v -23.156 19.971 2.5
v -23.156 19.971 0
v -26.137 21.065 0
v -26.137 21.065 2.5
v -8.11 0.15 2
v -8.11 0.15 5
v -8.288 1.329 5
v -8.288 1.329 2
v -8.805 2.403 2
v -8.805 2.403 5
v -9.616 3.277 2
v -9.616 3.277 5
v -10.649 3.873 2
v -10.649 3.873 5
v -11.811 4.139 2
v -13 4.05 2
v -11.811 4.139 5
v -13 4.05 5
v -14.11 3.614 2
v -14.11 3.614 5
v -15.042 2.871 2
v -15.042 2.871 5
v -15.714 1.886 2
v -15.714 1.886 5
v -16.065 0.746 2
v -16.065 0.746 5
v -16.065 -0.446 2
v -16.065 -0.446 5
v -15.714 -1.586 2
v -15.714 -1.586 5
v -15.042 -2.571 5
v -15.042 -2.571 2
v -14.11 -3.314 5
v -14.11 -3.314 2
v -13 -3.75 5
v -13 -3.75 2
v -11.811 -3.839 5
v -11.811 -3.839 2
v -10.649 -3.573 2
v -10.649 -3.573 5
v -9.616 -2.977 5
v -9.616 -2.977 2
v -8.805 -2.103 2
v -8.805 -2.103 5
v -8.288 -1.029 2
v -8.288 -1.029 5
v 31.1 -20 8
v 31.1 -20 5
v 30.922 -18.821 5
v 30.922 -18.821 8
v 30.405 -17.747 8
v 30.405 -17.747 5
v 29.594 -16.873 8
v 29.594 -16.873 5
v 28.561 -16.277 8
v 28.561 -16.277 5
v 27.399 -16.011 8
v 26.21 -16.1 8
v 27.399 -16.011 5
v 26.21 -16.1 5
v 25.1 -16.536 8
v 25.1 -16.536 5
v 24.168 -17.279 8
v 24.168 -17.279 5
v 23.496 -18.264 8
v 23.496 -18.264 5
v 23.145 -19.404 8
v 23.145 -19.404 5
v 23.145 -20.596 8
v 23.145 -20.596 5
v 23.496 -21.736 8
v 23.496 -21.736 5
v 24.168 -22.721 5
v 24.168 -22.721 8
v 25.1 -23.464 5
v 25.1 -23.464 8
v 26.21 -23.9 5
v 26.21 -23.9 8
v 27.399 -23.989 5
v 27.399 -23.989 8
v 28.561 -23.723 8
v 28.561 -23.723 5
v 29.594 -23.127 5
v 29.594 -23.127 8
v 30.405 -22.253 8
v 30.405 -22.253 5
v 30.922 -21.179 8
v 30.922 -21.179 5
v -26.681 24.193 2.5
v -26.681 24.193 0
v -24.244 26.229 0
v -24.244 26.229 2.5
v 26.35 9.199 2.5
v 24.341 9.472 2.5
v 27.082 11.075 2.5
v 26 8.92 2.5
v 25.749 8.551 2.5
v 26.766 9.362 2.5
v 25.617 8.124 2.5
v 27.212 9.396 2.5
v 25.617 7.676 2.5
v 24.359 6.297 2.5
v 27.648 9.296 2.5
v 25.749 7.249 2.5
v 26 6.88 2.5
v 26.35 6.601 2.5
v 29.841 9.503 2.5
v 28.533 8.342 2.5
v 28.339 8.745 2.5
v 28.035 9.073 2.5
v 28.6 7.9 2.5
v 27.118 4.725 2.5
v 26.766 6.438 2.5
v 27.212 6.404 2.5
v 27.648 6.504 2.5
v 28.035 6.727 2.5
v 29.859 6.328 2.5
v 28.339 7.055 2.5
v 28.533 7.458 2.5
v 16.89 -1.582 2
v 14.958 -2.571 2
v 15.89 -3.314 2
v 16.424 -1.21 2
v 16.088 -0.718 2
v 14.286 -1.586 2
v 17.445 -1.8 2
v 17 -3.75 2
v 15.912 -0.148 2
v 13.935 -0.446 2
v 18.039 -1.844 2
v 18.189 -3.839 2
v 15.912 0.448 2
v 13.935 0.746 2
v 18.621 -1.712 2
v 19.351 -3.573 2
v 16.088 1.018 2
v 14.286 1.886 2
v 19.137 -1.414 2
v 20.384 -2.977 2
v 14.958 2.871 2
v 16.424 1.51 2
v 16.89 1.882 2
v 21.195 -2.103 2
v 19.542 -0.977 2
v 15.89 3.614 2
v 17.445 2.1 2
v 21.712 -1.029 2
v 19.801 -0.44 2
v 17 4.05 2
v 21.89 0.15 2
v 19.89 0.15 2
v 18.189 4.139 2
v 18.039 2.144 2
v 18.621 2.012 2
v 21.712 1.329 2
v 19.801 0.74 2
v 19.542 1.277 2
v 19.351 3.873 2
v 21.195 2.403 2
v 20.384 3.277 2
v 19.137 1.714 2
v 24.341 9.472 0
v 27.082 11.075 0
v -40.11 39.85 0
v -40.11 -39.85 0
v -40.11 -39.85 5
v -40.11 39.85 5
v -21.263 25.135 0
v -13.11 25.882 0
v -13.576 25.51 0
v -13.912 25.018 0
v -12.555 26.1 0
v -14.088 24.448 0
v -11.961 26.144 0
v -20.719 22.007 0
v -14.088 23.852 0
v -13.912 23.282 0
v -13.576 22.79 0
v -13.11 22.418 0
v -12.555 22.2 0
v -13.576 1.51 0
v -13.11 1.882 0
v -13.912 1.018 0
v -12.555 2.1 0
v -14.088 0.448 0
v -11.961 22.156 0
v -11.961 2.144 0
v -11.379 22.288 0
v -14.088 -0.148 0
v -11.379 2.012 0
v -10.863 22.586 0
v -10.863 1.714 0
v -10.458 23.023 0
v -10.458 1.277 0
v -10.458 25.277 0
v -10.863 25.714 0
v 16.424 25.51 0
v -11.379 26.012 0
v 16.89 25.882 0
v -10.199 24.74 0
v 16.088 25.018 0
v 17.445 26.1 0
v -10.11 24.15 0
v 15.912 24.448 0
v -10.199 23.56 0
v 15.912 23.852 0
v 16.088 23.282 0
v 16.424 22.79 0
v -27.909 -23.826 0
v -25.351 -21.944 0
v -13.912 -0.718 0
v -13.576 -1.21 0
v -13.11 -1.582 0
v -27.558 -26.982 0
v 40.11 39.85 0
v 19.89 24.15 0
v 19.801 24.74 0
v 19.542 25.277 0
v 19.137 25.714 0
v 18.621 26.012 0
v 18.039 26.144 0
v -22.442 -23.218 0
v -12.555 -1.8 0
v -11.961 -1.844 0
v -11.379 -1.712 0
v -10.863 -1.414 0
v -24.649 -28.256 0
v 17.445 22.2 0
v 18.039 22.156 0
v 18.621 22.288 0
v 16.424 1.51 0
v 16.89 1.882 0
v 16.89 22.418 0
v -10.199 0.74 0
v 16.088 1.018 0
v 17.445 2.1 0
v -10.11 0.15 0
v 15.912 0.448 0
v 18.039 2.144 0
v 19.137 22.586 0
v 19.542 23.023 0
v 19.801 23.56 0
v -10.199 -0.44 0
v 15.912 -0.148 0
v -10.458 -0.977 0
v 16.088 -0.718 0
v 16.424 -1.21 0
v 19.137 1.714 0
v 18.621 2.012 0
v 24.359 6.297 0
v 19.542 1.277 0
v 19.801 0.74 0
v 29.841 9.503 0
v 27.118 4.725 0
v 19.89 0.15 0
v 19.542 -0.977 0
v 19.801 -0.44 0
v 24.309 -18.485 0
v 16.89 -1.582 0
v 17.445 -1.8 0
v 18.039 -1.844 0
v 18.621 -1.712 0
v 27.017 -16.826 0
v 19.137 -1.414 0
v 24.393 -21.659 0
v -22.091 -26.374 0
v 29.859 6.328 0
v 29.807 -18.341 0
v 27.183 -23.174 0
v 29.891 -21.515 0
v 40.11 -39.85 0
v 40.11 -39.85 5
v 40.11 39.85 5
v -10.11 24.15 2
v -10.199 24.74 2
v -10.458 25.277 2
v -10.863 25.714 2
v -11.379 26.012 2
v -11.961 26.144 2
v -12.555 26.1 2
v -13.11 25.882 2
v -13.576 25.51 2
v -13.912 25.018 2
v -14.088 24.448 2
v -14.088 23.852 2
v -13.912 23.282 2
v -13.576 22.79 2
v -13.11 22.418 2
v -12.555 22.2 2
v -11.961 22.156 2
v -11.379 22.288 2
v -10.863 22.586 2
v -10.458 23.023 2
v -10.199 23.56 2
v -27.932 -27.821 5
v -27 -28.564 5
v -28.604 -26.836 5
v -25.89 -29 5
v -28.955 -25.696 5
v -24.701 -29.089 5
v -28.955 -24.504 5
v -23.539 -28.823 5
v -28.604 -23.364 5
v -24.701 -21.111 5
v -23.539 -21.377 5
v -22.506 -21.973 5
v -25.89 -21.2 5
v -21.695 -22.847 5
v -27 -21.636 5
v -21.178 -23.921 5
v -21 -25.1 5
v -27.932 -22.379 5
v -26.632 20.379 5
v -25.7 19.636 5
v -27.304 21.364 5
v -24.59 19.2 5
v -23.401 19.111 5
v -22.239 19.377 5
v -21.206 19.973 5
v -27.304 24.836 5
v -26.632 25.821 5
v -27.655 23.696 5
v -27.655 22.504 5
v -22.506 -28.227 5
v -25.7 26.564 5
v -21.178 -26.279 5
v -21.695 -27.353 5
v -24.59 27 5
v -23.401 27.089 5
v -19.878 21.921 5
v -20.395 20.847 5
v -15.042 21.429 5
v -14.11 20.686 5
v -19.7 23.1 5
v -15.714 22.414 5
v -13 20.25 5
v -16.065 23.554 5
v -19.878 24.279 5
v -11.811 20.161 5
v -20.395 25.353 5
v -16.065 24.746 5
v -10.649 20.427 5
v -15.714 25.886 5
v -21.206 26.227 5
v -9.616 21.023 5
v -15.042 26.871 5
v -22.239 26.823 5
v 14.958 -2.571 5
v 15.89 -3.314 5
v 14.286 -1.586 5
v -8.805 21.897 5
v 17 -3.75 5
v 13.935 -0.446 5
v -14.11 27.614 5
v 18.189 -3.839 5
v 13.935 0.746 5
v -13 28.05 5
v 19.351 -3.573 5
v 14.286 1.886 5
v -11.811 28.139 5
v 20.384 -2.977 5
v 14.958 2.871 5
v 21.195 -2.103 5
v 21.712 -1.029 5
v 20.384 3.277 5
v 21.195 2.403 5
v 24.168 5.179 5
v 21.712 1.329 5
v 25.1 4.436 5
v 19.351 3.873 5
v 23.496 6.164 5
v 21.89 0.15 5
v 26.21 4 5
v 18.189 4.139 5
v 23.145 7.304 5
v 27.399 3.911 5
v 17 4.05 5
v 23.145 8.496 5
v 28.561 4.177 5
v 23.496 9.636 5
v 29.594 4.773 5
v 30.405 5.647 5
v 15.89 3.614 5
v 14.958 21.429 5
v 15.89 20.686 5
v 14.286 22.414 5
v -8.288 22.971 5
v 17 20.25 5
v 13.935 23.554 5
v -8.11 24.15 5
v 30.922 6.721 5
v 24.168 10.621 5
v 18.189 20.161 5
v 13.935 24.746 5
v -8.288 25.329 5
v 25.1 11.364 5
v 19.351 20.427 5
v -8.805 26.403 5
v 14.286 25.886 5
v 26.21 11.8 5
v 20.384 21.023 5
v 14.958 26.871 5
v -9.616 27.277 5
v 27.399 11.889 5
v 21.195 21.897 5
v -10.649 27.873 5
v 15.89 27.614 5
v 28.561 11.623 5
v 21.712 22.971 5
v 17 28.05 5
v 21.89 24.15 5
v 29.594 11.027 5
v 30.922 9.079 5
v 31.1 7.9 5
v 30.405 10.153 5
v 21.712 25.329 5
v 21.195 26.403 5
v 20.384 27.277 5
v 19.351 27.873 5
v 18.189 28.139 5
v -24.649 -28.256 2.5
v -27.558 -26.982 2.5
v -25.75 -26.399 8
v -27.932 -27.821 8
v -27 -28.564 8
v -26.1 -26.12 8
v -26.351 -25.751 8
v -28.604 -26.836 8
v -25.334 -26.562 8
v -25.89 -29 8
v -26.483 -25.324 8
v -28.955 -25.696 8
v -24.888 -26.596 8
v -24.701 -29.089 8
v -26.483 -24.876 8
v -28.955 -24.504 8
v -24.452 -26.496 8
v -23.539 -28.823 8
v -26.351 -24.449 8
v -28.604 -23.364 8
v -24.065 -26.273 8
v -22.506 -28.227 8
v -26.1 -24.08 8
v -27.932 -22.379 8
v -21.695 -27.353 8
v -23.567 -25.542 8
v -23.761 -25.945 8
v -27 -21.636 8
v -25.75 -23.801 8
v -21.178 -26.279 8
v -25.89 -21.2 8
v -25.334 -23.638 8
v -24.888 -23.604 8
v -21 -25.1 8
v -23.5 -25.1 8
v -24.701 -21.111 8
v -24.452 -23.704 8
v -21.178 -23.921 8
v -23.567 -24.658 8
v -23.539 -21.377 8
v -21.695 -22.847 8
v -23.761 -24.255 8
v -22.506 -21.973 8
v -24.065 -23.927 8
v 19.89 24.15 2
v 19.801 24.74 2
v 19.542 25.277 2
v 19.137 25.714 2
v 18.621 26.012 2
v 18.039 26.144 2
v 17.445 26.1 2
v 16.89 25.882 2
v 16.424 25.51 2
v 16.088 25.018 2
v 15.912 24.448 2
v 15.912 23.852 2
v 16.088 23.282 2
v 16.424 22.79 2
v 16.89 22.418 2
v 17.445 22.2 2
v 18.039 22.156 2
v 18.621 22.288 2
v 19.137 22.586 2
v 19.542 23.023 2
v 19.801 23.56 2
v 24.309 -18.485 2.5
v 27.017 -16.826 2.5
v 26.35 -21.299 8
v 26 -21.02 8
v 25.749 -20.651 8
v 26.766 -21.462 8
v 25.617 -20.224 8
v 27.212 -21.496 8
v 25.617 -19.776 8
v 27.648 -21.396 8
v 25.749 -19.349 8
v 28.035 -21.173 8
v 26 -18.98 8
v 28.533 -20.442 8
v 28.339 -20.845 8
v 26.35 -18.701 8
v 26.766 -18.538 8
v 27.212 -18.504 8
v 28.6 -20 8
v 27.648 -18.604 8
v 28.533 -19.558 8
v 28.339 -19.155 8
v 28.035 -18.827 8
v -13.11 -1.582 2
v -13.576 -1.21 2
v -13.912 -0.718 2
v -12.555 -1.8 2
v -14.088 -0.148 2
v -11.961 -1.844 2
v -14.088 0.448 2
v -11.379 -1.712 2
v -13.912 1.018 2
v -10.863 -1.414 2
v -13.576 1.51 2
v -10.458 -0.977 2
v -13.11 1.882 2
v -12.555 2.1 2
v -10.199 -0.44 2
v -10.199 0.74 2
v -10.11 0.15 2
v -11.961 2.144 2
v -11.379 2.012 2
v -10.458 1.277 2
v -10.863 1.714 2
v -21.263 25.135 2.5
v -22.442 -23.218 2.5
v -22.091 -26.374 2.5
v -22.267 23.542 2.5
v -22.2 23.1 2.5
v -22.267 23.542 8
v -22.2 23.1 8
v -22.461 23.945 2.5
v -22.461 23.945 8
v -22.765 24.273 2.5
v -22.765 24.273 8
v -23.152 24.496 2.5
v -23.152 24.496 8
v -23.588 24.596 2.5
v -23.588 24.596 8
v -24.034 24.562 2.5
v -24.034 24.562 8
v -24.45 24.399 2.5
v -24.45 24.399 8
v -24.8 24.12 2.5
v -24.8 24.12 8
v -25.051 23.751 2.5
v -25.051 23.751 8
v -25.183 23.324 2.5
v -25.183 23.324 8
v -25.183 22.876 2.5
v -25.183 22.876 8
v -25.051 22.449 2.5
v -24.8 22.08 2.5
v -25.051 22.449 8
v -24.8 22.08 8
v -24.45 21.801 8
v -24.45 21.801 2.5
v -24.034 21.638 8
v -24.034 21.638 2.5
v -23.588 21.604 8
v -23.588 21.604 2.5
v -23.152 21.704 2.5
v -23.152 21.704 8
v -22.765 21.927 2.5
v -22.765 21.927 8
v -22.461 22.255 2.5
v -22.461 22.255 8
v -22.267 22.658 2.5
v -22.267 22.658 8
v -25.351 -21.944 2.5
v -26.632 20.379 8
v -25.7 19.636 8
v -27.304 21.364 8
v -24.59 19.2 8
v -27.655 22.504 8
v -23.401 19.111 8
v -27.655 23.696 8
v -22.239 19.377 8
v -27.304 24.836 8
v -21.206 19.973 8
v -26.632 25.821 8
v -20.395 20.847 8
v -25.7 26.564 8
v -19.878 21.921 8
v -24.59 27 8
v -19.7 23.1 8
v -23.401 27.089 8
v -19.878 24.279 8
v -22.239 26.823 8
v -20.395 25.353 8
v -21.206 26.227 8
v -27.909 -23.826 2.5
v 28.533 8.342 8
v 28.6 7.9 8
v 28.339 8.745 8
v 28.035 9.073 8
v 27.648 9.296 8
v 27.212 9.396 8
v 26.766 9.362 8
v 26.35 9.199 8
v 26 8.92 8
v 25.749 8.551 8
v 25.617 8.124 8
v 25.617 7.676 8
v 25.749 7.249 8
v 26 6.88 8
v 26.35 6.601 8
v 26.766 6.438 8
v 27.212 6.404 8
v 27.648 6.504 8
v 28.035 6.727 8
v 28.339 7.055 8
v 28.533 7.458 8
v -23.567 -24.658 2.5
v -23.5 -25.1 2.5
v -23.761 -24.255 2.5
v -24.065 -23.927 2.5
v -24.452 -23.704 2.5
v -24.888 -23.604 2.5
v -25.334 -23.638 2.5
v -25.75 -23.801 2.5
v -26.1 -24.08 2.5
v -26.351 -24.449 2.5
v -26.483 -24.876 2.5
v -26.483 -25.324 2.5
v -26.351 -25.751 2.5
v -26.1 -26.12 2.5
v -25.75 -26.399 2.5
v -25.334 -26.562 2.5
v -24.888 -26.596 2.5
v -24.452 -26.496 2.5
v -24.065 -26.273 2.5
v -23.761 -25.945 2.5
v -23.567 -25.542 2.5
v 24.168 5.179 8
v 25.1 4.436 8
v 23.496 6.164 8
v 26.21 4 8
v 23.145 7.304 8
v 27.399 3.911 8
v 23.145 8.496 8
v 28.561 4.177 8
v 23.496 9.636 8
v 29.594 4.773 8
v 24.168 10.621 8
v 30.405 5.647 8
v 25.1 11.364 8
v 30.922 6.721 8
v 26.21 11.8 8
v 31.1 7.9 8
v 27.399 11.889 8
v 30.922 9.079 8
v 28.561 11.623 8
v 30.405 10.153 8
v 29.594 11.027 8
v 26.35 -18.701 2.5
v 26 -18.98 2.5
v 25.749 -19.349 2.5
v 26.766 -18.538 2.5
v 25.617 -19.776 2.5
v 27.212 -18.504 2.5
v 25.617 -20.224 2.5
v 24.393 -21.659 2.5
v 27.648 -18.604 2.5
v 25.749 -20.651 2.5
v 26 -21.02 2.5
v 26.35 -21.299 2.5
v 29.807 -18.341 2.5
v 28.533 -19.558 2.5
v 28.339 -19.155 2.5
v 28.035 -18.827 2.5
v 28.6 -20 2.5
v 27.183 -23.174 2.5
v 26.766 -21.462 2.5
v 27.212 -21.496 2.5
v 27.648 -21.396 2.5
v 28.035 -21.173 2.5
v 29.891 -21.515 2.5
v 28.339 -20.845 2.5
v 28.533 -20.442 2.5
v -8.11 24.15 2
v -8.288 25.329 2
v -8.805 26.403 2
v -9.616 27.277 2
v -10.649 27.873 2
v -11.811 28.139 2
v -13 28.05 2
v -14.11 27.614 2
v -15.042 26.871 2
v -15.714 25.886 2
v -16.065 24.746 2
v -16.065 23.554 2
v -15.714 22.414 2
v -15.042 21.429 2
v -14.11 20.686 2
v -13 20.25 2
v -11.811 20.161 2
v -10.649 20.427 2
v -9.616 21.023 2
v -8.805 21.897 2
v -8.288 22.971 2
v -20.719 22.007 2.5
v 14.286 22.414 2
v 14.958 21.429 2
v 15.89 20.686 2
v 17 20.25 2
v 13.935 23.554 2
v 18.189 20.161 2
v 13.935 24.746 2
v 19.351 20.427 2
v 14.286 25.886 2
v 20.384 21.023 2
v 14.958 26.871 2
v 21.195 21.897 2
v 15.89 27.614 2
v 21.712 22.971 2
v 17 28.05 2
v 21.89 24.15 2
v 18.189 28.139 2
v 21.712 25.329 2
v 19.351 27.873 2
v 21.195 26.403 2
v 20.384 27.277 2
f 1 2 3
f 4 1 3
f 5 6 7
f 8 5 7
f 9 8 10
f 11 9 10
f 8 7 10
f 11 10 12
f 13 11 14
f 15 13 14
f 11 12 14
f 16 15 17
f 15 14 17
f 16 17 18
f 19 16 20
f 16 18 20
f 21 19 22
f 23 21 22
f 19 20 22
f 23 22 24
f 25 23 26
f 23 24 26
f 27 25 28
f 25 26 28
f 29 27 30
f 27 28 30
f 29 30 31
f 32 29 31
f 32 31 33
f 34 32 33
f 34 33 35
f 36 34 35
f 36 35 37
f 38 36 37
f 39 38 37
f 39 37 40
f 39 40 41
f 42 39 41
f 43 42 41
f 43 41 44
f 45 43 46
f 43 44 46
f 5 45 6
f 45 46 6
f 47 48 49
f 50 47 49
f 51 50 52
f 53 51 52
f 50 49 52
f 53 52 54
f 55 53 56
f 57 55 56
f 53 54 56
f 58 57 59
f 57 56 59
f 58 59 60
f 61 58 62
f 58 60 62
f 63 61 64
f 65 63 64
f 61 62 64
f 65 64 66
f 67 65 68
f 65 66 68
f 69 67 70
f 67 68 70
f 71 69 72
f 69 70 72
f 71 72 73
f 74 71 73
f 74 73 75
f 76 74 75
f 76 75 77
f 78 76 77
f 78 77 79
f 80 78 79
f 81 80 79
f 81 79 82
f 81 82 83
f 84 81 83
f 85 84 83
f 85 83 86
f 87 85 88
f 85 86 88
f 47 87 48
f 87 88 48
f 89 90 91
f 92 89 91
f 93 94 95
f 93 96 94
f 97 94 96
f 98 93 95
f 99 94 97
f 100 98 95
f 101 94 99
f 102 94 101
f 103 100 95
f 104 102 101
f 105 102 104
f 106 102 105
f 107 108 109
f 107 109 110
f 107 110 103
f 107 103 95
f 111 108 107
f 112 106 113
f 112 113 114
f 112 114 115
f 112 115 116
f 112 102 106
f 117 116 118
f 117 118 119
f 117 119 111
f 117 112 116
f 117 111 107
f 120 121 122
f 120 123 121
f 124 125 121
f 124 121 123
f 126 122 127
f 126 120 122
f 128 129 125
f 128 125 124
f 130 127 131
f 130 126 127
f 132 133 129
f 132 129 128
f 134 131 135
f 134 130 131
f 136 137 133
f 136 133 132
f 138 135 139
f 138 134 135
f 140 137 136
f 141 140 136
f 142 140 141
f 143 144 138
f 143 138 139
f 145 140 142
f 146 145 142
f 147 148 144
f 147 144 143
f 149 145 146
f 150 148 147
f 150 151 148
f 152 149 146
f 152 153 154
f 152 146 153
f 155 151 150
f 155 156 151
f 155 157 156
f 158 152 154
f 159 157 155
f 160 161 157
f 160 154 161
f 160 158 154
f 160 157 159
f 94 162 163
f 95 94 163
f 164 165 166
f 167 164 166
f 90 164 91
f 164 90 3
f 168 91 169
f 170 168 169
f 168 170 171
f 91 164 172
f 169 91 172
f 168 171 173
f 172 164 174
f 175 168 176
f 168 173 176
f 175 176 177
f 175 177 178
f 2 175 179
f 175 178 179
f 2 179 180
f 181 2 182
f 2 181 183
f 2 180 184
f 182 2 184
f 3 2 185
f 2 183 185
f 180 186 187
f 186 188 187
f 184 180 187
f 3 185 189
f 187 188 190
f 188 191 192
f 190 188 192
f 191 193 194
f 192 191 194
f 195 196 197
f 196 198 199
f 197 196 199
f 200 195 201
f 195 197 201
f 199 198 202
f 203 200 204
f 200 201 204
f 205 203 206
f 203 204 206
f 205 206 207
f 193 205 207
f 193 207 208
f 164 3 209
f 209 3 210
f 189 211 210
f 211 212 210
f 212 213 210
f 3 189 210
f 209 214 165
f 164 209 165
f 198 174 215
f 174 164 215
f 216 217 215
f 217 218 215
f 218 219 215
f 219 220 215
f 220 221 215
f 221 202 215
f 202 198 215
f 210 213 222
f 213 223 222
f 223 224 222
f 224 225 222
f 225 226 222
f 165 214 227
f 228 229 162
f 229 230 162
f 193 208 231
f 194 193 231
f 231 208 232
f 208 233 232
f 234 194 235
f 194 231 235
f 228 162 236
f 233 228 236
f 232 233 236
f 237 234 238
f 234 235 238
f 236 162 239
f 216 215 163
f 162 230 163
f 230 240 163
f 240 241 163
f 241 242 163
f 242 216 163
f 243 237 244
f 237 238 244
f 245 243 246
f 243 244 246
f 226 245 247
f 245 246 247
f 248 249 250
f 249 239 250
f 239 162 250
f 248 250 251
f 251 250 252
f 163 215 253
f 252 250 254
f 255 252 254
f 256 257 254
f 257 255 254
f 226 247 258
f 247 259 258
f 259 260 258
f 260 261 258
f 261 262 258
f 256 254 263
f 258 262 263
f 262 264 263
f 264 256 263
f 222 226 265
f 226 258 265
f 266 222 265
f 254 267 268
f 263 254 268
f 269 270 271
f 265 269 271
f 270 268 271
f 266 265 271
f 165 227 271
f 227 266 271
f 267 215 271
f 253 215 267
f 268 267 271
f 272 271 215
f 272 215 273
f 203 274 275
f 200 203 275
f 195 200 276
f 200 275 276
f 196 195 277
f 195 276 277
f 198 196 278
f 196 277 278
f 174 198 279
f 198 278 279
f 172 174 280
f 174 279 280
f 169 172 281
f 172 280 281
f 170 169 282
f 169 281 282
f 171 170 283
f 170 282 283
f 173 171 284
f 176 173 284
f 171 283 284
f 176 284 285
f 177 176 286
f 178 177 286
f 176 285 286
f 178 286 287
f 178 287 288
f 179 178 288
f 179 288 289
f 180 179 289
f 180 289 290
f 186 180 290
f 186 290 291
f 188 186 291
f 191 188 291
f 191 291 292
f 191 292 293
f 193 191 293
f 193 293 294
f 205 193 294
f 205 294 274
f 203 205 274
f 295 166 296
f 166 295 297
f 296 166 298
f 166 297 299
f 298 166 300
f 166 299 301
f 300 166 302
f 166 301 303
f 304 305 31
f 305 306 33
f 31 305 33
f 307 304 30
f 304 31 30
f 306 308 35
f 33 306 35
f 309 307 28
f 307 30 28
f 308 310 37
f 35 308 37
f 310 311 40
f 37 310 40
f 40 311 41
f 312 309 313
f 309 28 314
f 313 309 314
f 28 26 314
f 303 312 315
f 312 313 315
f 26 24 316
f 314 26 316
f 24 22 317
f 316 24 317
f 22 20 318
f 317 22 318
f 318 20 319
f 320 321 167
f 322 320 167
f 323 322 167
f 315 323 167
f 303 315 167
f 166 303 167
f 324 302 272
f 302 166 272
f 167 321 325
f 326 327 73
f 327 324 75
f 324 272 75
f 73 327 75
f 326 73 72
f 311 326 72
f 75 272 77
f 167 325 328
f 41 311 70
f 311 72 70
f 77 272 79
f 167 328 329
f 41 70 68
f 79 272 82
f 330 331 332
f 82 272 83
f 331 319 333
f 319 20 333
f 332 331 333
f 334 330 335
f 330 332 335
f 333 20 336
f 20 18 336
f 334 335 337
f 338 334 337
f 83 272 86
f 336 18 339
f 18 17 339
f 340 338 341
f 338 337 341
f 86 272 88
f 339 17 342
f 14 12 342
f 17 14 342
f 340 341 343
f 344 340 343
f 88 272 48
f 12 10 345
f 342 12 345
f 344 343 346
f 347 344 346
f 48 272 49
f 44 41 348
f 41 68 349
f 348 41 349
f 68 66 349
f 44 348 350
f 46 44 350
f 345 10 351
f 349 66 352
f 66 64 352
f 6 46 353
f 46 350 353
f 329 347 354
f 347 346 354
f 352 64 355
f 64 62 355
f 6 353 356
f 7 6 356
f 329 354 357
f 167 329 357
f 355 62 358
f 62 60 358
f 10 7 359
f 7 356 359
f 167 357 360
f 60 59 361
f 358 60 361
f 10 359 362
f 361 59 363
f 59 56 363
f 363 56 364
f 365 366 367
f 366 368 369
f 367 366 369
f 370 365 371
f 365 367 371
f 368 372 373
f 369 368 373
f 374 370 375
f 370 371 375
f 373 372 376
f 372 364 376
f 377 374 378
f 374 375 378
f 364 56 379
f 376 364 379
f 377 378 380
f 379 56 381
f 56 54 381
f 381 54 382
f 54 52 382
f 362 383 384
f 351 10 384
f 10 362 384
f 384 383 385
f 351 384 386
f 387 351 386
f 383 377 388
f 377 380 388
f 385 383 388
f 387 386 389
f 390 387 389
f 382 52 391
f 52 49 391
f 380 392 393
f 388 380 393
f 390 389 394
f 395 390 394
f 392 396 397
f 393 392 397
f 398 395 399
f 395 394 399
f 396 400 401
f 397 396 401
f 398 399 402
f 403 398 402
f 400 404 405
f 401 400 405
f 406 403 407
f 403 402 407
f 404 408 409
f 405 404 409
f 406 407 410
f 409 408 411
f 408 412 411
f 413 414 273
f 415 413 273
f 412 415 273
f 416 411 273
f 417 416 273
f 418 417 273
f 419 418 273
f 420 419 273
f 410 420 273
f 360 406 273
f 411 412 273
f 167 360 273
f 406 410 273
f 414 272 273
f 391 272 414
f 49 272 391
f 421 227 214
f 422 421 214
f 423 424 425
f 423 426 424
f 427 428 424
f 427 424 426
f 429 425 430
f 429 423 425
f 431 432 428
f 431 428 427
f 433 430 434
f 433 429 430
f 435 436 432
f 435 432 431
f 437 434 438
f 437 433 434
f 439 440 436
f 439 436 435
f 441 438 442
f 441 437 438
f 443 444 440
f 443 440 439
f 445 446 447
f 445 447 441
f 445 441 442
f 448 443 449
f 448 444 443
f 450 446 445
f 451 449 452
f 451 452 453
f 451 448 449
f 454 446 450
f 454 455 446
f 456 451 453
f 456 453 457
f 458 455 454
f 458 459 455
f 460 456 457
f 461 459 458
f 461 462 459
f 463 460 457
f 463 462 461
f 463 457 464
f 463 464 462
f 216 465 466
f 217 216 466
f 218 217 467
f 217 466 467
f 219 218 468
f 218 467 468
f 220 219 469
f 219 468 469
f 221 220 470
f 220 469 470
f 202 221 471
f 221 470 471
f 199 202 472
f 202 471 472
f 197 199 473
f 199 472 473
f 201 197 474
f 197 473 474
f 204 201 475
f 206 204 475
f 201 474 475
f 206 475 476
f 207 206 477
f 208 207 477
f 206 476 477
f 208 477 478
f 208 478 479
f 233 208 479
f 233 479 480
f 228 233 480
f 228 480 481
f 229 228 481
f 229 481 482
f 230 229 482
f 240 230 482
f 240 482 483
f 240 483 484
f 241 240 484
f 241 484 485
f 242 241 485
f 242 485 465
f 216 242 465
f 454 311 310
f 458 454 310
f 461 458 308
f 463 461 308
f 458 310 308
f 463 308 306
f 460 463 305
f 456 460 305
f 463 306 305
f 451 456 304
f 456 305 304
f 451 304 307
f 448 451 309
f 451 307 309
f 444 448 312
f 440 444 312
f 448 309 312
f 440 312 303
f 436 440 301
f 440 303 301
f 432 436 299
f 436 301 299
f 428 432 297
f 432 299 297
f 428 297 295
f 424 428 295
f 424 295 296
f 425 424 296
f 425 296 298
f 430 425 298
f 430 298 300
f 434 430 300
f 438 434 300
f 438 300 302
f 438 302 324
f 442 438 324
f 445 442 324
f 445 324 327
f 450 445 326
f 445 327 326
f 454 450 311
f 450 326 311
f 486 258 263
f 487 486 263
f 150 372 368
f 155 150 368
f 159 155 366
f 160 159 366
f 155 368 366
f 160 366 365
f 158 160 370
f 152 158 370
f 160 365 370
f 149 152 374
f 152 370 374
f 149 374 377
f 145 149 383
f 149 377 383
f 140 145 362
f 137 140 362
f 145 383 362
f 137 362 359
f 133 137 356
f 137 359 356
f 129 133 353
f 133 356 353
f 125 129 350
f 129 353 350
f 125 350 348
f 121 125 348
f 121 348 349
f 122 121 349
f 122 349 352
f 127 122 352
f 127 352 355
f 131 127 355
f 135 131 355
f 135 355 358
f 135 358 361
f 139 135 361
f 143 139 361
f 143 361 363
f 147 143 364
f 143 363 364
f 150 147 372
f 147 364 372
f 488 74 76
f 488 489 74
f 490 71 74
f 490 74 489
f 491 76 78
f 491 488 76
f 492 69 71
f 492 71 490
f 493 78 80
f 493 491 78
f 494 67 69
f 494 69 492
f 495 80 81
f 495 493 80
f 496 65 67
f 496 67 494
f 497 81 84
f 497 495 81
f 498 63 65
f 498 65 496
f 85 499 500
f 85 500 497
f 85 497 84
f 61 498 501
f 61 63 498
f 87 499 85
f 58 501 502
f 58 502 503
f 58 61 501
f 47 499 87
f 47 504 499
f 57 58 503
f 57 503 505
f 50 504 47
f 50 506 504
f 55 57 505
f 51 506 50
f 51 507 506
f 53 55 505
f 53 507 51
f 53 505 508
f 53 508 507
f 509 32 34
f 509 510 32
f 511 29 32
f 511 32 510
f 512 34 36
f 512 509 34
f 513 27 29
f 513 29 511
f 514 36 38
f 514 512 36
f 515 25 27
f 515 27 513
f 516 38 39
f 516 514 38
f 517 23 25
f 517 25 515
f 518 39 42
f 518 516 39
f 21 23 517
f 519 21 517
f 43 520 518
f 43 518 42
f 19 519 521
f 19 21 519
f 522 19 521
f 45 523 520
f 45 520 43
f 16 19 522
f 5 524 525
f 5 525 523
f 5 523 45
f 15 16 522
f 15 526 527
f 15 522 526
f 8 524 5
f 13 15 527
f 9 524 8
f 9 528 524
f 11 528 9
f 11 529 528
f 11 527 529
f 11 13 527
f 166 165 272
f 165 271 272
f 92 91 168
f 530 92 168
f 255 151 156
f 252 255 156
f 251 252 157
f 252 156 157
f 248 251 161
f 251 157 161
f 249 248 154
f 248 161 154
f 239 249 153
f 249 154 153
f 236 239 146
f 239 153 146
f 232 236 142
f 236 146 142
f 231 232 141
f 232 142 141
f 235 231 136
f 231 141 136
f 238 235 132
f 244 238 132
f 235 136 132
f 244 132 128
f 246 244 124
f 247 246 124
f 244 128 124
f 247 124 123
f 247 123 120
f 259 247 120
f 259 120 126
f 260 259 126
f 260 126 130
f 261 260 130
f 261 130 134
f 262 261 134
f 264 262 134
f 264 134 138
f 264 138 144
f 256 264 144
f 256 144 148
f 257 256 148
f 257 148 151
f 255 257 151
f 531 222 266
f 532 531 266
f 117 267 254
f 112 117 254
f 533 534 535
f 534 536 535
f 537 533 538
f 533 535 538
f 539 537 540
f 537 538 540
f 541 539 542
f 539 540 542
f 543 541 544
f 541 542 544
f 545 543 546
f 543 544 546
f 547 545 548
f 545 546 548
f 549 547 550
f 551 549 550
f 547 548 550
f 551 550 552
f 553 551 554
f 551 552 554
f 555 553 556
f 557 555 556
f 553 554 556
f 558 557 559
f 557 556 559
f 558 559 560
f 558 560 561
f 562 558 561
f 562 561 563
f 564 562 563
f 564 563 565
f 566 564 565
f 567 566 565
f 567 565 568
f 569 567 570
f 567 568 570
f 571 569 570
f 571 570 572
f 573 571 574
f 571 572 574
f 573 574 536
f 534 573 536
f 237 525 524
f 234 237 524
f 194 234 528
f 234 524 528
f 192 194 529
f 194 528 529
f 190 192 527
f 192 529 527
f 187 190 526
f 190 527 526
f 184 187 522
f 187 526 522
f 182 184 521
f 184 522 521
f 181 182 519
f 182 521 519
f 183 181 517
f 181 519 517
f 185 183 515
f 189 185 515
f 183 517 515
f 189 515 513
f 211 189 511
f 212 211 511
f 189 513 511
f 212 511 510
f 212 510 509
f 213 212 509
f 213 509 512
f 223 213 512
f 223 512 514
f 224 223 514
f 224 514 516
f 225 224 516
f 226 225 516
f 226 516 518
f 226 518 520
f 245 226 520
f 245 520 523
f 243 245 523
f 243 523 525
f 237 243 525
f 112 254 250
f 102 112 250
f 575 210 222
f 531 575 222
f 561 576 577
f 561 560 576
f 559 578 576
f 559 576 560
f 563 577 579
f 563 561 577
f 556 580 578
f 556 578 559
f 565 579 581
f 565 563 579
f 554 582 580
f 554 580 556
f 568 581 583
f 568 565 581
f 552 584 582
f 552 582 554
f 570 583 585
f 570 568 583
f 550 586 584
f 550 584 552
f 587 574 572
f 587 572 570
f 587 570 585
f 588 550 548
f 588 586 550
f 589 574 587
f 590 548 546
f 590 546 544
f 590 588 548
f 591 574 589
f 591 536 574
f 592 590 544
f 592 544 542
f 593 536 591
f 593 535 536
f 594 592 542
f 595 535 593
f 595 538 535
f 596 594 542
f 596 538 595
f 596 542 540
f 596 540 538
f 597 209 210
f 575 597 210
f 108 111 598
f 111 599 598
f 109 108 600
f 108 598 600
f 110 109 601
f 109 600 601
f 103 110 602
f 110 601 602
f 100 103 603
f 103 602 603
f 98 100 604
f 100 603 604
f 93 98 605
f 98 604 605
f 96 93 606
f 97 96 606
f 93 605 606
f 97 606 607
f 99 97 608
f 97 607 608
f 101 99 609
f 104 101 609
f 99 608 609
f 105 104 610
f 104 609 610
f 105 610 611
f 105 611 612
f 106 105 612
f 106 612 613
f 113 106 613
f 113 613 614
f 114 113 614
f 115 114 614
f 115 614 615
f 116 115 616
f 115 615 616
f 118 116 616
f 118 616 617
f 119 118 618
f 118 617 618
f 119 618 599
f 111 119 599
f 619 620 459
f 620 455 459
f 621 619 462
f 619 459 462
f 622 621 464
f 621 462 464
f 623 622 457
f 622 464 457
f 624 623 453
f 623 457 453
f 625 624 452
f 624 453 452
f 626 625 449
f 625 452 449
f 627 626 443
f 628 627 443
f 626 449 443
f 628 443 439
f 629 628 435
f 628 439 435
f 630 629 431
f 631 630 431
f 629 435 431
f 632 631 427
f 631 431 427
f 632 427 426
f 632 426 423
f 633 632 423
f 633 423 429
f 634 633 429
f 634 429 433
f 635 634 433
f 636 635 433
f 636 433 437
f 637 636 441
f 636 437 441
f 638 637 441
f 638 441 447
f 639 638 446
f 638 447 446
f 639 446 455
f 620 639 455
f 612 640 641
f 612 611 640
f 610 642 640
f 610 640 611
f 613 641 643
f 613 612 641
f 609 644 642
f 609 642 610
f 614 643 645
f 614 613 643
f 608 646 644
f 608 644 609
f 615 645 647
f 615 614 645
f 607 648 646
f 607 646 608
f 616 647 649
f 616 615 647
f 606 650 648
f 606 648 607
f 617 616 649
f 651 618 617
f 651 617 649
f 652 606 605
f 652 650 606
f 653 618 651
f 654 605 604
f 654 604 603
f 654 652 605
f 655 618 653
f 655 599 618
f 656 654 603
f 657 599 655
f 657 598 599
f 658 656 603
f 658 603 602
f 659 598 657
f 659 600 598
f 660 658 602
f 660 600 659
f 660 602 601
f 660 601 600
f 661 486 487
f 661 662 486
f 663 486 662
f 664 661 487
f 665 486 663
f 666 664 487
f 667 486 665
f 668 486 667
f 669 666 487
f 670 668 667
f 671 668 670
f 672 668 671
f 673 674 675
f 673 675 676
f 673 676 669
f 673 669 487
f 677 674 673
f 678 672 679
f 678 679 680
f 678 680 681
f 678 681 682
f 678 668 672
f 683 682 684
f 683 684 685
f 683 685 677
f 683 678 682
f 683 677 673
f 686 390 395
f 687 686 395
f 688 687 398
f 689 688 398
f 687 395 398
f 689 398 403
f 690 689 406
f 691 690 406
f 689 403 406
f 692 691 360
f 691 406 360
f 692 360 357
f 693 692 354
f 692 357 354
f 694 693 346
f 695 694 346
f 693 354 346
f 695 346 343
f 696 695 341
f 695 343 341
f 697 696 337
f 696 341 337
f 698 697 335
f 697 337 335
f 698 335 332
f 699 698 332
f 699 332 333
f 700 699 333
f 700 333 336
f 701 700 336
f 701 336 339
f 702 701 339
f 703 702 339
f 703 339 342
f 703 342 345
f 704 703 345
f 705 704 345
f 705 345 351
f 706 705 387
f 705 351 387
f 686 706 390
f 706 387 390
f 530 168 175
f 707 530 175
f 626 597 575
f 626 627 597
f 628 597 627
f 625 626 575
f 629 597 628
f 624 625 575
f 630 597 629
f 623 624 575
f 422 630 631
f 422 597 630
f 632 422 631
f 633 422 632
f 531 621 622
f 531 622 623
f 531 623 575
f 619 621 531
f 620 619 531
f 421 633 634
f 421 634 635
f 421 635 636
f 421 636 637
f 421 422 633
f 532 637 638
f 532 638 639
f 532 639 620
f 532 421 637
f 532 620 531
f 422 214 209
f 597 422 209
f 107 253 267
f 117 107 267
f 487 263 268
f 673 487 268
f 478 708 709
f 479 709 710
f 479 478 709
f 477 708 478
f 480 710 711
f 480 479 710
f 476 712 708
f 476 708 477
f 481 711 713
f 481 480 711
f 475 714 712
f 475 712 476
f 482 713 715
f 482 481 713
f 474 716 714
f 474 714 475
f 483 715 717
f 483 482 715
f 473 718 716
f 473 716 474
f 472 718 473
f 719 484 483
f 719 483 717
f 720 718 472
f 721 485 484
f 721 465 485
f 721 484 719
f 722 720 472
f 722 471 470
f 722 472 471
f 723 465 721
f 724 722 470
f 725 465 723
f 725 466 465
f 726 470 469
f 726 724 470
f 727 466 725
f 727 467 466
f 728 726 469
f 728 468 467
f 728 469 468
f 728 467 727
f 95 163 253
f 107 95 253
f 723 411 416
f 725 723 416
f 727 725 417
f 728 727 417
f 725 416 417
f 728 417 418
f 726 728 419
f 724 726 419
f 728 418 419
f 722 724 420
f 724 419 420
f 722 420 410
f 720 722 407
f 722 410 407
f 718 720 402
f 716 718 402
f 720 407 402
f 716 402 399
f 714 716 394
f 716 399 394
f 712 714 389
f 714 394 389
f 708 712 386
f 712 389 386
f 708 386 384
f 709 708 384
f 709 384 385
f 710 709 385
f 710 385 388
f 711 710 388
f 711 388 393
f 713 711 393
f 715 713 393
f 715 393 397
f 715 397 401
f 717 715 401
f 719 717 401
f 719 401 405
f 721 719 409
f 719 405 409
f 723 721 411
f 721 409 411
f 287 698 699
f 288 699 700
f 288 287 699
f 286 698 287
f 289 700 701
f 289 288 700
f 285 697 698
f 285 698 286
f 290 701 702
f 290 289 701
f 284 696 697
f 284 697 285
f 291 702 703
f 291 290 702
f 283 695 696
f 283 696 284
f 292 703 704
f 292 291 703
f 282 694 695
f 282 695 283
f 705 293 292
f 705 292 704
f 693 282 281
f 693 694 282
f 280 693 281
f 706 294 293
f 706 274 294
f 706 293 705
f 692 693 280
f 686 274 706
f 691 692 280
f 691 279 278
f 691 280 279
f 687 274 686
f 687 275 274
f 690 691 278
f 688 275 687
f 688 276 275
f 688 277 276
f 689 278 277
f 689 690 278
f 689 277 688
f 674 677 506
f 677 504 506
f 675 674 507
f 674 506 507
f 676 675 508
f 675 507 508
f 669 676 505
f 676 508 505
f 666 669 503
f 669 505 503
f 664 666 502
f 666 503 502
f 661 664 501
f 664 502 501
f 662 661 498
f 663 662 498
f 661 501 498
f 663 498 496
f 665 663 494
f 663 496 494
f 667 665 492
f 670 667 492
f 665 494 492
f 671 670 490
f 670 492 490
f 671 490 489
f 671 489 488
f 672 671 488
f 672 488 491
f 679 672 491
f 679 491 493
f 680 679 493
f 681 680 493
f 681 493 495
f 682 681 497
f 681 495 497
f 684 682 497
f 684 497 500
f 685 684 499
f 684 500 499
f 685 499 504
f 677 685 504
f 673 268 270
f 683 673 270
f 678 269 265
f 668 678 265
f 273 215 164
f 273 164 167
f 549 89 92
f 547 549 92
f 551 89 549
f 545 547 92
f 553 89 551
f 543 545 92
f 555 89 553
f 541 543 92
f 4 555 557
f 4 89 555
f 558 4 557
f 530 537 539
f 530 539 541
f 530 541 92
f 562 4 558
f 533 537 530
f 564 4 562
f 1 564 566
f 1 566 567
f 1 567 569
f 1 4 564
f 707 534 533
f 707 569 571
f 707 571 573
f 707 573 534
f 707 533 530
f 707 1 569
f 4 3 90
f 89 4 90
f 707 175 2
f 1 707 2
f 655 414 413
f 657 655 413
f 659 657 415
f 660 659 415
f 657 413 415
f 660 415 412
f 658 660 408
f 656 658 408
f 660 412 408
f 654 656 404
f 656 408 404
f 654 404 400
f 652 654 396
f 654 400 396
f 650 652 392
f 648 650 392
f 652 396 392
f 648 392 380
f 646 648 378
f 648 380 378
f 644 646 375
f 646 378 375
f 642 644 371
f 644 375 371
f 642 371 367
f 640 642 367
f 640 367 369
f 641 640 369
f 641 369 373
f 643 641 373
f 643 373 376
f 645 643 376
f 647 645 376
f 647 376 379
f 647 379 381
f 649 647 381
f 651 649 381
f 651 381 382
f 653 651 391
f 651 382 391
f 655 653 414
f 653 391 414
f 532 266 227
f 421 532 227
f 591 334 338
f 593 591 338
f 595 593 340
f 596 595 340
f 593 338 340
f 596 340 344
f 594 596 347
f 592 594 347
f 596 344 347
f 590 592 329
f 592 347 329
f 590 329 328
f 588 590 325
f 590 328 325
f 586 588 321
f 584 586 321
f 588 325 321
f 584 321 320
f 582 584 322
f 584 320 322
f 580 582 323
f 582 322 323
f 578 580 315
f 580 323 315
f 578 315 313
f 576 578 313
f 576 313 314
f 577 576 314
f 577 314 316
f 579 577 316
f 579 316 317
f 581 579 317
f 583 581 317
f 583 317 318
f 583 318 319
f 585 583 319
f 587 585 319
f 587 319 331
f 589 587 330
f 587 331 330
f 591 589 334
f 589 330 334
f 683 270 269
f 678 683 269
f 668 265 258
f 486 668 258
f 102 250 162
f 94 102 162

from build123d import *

# Parameters (mm, degrees)
F0_W          = 70
F0_H          = 60
F1_DEPTH      = 5
F2_R          = 4
F3_DEPTH      = 3
F4_R          = 1.5
F5_DEPTH      = 3.001
F5_DEPTH_BACK = 5
F6_DEPTH      = 9.85
F7_DEPTH      = 9.85
F8_DEPTH      = 5.11
F9_DEPTH      = 5.11
F10_R         = 2
F11_DEPTH     = 5
F12_R         = 4
F13_DEPTH     = 3
F15_DEPTH     = 2.5


with BuildPart() as f1:
    # F0 (on Top) → F1 (new body)
    with BuildSketch(Plane.XY):
        Rectangle(F0_W, F0_H)
    extrude(amount=F1_DEPTH)

    # F2 (on face) → F3 (join)
    with BuildSketch(Plane.XY.offset(5)):
        with Locations((-23.7, 23.1)):
            Circle(F2_R)
        with Locations((-25, -25.1)):
            Circle(F2_R)
        with Locations((27.1, 7.9)):
            Circle(F2_R)
        with Locations((27.1, -20)):
            Circle(F2_R)
    extrude(amount=F3_DEPTH)

    # F4 (on face) → F5 (cut, two sides)
    with BuildSketch(Plane.XY.offset(5)) as f5_sk:
        with Locations((-23.7, 23.1)):
            Circle(F4_R)
        with Locations((27.1, 7.9)):
            Circle(F4_R)
        with Locations((27.1, -20)):
            Circle(F4_R)
        with Locations((-25, -25.1)):
            Circle(F4_R)
    extrude(amount=F5_DEPTH, mode=Mode.SUBTRACT)
    extrude(f5_sk.sketch, amount=-F5_DEPTH_BACK, mode=Mode.SUBTRACT)

    # F6 (add): a face of the model
    f6_faces = [f1.faces().sort_by_distance(p)[0] for p in [
        (0, -30, 2.5),
    ]]
    extrude(f6_faces, amount=F6_DEPTH)

    # F7 (add): a face of the model
    f7_faces = [f1.faces().sort_by_distance(p)[0] for p in [
        (0, 30, 2.5),
    ]]
    extrude(f7_faces, amount=F7_DEPTH)

    # F8 (add): a face of the model
    f8_faces = [f1.faces().sort_by_distance(p)[0] for p in [
        (35, 0, 2.5),
    ]]
    extrude(f8_faces, amount=F8_DEPTH)

    # F9 (add): a face of the model
    f9_faces = [f1.faces().sort_by_distance(p)[0] for p in [
        (-35, 0, 2.5),
    ]]
    extrude(f9_faces, amount=F9_DEPTH)

    # F10 (on face) → F11 (cut)
    with BuildSketch(Plane.XY.offset(5)):
        with Locations((-12.11, 0.15)):
            Circle(F10_R)
        with Locations((-12.11, 24.15)):
            Circle(F10_R)
        with Locations((17.89, 24.15)):
            Circle(F10_R)
        with Locations((17.89, 0.15)):
            Circle(F10_R)
    extrude(amount=-F11_DEPTH, mode=Mode.SUBTRACT)

    # F12 (on face) → F13 (cut)
    with BuildSketch(Plane.XY.offset(5)):
        with Locations((-12.11, 0.15)):
            Circle(F12_R)
        with Locations((-12.11, 24.15)):
            Circle(F12_R)
        with Locations((17.89, 24.15)):
            Circle(F12_R)
        with Locations((17.89, 0.15)):
            Circle(F12_R)
    extrude(amount=-F13_DEPTH, mode=Mode.SUBTRACT)

    # F14 (on face) → F15 (cut)
    with BuildSketch(Plane(origin=(0, 0, 0), x_dir=(1, 0, 0), z_dir=(0, 0, -1))):
        Polygon((-24.6492034201, 28.2559903506), (-27.5577695278, 26.981793925), (-27.9085661076, 23.8258035744), (-25.3507965799, 21.9440096494), (-22.4422304722, 23.218206075), (-22.0914338924, 26.3741964256), align=None)
        Polygon((27.1832127793, 23.1743359883), (24.3925507836, 21.659232375), (24.3093380043, 18.4848963867), (27.0167872207, 16.8256640117), (29.8074492164, 18.340767625), (29.8906619957, 21.5151036133), align=None)
        Polygon((27.1178128759, -4.7246234814), (24.3589497063, -6.2968853377), (24.3411368304, -9.4722618563), (27.0821871241, -11.0753765186), (29.8410502937, -9.5031146623), (29.8588631696, -6.3277381437), align=None)
        Polygon((-23.1561984645, -19.9714838624), (-26.1374736836, -21.0647959868), (-26.6812752191, -24.1933121244), (-24.2438015355, -26.2285161376), (-21.2625263164, -25.1352040132), (-20.7187247809, -22.0066878756), align=None)
    extrude(amount=-F15_DEPTH, mode=Mode.SUBTRACT)


solid = f1.part
